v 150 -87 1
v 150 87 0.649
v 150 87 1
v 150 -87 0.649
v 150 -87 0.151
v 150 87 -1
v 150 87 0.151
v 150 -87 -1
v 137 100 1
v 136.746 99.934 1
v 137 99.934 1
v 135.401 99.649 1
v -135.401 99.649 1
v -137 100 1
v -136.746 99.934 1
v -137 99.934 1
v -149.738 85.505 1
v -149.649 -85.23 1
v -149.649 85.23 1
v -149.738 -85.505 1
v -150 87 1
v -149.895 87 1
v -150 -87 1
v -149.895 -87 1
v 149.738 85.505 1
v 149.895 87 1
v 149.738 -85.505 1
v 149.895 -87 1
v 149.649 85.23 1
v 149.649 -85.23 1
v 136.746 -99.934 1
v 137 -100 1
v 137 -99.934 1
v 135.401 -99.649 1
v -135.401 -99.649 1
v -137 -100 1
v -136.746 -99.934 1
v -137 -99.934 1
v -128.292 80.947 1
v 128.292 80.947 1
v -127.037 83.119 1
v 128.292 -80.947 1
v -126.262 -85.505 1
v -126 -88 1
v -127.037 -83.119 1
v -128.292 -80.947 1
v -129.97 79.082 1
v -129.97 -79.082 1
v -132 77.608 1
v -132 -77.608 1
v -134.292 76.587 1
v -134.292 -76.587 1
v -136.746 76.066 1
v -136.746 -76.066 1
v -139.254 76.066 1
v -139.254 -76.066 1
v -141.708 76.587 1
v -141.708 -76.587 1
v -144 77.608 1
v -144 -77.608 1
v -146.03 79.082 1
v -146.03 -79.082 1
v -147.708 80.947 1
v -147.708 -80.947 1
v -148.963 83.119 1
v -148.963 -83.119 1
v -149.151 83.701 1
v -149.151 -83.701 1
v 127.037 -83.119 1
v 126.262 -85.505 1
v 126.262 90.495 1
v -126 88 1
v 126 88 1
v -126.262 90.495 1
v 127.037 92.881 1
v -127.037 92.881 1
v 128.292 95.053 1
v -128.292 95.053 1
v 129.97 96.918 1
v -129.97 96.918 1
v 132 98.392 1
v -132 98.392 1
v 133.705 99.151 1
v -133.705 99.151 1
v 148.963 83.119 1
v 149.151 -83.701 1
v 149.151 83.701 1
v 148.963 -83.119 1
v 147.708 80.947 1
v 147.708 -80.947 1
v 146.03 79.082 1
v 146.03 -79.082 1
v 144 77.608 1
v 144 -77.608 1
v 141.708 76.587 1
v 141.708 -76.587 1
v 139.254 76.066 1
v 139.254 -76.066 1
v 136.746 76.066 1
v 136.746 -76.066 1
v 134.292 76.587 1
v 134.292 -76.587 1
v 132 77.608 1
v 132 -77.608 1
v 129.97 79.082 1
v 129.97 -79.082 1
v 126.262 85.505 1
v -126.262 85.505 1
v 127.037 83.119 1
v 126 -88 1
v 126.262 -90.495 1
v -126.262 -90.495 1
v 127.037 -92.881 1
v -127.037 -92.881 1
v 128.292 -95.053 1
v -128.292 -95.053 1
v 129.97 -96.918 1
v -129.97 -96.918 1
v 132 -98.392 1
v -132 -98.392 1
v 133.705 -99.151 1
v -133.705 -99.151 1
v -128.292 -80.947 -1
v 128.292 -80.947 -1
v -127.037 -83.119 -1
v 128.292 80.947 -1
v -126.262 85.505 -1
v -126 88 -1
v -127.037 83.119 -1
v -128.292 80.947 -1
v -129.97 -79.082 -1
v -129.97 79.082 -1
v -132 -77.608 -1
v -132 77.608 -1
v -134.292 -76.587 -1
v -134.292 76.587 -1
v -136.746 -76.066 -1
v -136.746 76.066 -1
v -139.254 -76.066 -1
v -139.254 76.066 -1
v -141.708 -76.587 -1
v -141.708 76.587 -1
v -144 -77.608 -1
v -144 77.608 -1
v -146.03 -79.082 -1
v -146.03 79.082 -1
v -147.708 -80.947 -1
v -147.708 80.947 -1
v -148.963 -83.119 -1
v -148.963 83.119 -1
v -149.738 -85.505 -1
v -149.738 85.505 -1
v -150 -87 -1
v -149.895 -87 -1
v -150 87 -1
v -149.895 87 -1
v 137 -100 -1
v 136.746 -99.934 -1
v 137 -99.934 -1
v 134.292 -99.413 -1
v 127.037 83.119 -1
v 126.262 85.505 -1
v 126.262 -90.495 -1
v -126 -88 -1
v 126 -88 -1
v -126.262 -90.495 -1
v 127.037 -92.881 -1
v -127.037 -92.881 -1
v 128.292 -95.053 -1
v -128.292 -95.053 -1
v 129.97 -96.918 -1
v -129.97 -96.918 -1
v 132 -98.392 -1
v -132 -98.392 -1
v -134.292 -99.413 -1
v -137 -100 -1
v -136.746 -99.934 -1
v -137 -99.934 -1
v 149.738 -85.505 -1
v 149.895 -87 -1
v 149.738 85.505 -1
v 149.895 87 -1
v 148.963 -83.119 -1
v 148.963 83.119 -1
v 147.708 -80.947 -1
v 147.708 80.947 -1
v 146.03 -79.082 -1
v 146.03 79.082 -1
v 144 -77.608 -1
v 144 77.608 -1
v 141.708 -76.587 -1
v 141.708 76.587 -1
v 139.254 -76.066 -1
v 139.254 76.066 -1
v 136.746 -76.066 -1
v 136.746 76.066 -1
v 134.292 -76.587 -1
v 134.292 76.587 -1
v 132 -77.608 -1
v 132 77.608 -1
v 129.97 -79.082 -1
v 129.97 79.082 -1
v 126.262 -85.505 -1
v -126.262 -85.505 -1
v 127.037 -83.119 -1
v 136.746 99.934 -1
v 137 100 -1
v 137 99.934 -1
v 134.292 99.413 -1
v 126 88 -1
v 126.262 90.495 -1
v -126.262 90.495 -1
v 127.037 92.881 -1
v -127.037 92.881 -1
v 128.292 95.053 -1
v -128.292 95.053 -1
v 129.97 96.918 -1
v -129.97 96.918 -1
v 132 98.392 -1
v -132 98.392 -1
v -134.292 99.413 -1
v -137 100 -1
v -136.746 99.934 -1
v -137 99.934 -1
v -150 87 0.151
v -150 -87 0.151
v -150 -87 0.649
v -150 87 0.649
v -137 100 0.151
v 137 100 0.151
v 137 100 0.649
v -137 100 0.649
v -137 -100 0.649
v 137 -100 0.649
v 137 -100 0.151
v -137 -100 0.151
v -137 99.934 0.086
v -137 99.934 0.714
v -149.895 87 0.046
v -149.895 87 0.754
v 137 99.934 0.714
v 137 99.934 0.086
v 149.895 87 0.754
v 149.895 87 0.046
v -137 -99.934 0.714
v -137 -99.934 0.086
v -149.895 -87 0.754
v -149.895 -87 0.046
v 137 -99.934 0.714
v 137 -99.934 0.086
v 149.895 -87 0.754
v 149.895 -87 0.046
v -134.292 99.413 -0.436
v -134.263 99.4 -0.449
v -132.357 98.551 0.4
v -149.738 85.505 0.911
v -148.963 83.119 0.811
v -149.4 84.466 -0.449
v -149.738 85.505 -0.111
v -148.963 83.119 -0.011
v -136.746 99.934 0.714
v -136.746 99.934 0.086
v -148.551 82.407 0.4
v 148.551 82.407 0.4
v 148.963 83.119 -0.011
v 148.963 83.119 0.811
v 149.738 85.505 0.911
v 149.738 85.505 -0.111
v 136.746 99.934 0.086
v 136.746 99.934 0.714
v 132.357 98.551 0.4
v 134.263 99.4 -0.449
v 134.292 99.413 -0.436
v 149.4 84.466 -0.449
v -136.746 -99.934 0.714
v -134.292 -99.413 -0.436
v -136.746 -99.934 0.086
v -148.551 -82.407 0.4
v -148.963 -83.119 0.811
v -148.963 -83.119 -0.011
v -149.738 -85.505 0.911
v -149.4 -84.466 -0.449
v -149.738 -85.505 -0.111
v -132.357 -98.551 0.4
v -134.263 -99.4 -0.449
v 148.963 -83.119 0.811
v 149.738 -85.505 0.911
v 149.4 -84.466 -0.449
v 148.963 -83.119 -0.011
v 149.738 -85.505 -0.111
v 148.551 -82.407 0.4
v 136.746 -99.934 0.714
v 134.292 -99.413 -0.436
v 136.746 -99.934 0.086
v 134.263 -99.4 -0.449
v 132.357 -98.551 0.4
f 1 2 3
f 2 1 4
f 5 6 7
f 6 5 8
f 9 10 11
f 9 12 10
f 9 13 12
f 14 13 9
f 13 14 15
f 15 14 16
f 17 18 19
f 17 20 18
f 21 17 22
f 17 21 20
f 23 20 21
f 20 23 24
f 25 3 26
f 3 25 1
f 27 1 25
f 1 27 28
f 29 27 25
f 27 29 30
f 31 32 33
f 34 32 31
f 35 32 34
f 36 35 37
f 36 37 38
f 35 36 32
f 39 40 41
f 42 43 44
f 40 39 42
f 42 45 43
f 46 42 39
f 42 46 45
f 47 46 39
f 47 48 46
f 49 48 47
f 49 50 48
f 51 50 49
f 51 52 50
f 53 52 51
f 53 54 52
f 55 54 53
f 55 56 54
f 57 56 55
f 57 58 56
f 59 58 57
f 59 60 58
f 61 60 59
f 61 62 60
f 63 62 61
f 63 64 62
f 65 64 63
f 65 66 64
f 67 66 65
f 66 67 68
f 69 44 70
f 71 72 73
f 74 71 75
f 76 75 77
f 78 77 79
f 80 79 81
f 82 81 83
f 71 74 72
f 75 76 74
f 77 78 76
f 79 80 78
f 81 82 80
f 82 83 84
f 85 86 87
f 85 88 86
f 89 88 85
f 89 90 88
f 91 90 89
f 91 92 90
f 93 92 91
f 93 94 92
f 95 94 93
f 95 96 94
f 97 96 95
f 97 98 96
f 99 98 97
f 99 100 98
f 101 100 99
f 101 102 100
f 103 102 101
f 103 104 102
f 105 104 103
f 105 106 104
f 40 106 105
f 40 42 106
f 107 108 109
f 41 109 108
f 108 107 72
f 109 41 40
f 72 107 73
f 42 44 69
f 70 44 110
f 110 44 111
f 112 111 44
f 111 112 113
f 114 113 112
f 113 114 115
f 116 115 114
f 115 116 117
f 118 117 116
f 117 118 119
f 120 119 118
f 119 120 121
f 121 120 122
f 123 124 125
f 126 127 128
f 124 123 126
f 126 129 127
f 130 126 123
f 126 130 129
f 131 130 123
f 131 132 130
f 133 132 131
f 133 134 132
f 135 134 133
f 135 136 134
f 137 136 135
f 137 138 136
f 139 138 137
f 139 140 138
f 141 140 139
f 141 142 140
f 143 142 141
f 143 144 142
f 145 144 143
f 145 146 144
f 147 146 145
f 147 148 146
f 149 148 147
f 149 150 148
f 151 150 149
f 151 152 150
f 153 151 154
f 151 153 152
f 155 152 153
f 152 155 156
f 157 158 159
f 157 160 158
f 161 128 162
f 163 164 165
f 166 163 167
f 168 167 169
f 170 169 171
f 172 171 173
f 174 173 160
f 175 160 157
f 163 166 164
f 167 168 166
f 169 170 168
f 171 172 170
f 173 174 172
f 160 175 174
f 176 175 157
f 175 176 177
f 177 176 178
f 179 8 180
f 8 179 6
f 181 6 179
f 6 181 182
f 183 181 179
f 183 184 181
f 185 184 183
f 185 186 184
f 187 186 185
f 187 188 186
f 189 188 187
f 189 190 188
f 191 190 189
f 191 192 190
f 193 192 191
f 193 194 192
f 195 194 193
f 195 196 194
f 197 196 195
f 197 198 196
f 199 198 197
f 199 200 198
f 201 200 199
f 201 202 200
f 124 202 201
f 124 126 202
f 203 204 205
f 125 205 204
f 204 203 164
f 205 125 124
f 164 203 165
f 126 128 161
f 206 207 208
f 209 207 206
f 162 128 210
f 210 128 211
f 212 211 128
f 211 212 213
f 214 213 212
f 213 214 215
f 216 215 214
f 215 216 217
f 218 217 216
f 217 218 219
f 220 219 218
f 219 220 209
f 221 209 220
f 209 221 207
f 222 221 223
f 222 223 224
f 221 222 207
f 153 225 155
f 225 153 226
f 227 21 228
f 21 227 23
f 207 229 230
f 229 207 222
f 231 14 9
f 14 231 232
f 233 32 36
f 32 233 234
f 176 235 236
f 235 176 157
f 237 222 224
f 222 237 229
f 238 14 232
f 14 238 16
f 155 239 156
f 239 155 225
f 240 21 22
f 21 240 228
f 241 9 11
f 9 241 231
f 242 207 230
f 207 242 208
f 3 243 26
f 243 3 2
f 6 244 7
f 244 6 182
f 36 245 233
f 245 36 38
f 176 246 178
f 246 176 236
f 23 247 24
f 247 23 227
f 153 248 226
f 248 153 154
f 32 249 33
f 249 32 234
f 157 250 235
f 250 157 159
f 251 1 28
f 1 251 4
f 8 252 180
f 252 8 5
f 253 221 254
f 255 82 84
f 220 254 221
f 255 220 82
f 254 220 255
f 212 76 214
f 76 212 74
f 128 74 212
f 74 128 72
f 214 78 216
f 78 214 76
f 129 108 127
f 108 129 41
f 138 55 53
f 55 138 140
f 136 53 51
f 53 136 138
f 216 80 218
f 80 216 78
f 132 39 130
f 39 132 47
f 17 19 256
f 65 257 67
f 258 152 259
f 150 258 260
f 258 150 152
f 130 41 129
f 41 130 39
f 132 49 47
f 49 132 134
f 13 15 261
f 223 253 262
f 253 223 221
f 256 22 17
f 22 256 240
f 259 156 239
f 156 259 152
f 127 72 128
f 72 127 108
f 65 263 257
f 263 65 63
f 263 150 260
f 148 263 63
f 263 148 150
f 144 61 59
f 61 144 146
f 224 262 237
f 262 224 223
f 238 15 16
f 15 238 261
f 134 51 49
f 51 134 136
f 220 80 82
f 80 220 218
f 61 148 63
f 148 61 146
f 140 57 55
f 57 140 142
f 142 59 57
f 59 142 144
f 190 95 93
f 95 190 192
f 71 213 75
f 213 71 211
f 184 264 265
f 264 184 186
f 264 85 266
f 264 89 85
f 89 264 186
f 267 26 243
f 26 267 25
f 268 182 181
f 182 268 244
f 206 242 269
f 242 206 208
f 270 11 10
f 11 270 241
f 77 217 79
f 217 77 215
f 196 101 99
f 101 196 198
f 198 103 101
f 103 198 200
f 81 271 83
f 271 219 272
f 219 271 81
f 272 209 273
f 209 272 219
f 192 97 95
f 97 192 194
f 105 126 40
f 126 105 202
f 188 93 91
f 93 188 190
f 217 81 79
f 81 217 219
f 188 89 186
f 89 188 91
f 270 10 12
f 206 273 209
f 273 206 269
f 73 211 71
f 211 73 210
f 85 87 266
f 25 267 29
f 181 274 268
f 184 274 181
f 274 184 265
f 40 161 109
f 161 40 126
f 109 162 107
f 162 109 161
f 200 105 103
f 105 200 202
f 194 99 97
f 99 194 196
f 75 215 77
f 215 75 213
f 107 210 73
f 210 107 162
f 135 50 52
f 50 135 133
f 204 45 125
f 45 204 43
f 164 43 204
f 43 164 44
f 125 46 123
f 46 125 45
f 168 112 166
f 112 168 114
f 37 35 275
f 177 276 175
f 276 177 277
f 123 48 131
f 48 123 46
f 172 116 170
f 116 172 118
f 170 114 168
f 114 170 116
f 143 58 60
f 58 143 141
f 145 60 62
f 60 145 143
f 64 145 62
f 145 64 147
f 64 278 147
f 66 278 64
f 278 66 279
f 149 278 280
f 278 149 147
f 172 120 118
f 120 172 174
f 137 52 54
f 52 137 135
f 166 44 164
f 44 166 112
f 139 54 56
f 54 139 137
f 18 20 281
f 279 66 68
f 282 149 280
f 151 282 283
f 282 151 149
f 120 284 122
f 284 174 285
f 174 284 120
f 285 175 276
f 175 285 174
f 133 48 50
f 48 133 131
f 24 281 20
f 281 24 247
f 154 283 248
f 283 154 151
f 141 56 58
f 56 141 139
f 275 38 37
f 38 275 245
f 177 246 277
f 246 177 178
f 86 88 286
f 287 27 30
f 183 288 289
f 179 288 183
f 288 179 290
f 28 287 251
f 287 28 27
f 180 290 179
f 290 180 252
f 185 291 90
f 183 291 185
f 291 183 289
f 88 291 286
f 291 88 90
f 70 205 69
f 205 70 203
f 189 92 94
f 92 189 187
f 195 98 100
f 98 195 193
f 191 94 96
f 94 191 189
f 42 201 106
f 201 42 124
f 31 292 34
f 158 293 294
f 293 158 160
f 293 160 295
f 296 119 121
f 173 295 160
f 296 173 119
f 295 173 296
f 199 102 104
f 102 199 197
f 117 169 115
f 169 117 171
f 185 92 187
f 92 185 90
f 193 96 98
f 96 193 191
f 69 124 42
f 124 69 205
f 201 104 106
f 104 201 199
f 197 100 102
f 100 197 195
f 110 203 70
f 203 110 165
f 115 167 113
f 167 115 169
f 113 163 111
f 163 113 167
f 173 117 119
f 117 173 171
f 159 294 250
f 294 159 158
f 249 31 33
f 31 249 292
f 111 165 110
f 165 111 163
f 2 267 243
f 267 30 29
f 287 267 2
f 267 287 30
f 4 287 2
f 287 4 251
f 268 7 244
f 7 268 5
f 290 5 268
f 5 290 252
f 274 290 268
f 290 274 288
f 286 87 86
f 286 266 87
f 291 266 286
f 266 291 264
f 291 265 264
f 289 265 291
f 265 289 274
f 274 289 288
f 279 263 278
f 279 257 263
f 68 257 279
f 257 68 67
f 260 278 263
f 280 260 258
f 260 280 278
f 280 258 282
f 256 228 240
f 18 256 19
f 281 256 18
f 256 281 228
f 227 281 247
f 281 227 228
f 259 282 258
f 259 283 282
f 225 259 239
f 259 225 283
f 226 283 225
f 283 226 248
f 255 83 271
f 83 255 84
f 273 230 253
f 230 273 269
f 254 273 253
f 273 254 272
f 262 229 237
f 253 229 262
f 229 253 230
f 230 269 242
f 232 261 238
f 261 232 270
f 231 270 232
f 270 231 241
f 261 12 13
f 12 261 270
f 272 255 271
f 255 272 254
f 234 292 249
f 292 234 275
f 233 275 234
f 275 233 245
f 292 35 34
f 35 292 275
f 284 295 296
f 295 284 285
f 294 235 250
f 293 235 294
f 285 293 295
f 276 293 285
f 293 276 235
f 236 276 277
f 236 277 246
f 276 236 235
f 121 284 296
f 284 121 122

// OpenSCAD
// Parameters
sheet_length = 300; //[150:600:1]
sheet_width = 200; //[100:400:1]
sheet_thickness = 2; //[1:6:0.5]
corner_radius = 12; //[6:24:1]
chamfer_size = 0.6; //[0.2:2:0.1]
overlap = 1; //[0.5:2:0.1]

// Base Shapes
module sheet_body() {
  translate([0, 0, 0])
    cube([sheet_length, sheet_width, sheet_thickness], center=true);
}

module corner_cut(radius, x, y) {
  translate([x, y, 0])
    cylinder(h=sheet_thickness + 2*overlap, r=radius, center=true);
}

module corner_square(x, y) {
  translate([x, y, 0])
    cube([corner_radius + overlap, corner_radius + overlap, sheet_thickness + 2*overlap], center=true);
}

module chamfer_cut_x(x) {
  translate([x, 0, sheet_thickness/2 - chamfer_size])
    rotate([0, 45, 0])
      cube([chamfer_size*2, sheet_width + 2*overlap, chamfer_size*2], center=true);
}

module chamfer_cut_y(y) {
  translate([0, y, sheet_thickness/2 - chamfer_size])
    rotate([45, 0, 0])
      cube([sheet_length + 2*overlap, chamfer_size*2, chamfer_size*2], center=true);
}

// Operations
module rounded_corners() {
  difference() {
    sheet_body();
    corner_square(-sheet_length/2 + (corner_radius + overlap)/2, sheet_width/2 - (corner_radius + overlap)/2);
    corner_square(sheet_length/2 - (corner_radius + overlap)/2, sheet_width/2 - (corner_radius + overlap)/2);
    corner_square(-sheet_length/2 + (corner_radius + overlap)/2, -sheet_width/2 + (corner_radius + overlap)/2);
    corner_square(sheet_length/2 - (corner_radius + overlap)/2, -sheet_width/2 + (corner_radius + overlap)/2);
    corner_cut(corner_radius, -sheet_length/2 + corner_radius, sheet_width/2 - corner_radius);
    corner_cut(corner_radius, sheet_length/2 - corner_radius, sheet_width/2 - corner_radius);
    corner_cut(corner_radius, -sheet_length/2 + corner_radius, -sheet_width/2 + corner_radius);
    corner_cut(corner_radius, sheet_length/2 - corner_radius, -sheet_width/2 + corner_radius);
  }
}

module edge_chamfer() {
  difference() {
    rounded_corners();
    chamfer_cut_x(sheet_length/2 - chamfer_size);
    chamfer_cut_x(-sheet_length/2 + chamfer_size);
    chamfer_cut_y(sheet_width/2 - chamfer_size);
    chamfer_cut_y(-sheet_width/2 + chamfer_size);
  }
}

// Final Output
module complete_model() {
  union() {
    edge_chamfer();
  }
}

// Render the complete model
color("Silver") complete_model();
